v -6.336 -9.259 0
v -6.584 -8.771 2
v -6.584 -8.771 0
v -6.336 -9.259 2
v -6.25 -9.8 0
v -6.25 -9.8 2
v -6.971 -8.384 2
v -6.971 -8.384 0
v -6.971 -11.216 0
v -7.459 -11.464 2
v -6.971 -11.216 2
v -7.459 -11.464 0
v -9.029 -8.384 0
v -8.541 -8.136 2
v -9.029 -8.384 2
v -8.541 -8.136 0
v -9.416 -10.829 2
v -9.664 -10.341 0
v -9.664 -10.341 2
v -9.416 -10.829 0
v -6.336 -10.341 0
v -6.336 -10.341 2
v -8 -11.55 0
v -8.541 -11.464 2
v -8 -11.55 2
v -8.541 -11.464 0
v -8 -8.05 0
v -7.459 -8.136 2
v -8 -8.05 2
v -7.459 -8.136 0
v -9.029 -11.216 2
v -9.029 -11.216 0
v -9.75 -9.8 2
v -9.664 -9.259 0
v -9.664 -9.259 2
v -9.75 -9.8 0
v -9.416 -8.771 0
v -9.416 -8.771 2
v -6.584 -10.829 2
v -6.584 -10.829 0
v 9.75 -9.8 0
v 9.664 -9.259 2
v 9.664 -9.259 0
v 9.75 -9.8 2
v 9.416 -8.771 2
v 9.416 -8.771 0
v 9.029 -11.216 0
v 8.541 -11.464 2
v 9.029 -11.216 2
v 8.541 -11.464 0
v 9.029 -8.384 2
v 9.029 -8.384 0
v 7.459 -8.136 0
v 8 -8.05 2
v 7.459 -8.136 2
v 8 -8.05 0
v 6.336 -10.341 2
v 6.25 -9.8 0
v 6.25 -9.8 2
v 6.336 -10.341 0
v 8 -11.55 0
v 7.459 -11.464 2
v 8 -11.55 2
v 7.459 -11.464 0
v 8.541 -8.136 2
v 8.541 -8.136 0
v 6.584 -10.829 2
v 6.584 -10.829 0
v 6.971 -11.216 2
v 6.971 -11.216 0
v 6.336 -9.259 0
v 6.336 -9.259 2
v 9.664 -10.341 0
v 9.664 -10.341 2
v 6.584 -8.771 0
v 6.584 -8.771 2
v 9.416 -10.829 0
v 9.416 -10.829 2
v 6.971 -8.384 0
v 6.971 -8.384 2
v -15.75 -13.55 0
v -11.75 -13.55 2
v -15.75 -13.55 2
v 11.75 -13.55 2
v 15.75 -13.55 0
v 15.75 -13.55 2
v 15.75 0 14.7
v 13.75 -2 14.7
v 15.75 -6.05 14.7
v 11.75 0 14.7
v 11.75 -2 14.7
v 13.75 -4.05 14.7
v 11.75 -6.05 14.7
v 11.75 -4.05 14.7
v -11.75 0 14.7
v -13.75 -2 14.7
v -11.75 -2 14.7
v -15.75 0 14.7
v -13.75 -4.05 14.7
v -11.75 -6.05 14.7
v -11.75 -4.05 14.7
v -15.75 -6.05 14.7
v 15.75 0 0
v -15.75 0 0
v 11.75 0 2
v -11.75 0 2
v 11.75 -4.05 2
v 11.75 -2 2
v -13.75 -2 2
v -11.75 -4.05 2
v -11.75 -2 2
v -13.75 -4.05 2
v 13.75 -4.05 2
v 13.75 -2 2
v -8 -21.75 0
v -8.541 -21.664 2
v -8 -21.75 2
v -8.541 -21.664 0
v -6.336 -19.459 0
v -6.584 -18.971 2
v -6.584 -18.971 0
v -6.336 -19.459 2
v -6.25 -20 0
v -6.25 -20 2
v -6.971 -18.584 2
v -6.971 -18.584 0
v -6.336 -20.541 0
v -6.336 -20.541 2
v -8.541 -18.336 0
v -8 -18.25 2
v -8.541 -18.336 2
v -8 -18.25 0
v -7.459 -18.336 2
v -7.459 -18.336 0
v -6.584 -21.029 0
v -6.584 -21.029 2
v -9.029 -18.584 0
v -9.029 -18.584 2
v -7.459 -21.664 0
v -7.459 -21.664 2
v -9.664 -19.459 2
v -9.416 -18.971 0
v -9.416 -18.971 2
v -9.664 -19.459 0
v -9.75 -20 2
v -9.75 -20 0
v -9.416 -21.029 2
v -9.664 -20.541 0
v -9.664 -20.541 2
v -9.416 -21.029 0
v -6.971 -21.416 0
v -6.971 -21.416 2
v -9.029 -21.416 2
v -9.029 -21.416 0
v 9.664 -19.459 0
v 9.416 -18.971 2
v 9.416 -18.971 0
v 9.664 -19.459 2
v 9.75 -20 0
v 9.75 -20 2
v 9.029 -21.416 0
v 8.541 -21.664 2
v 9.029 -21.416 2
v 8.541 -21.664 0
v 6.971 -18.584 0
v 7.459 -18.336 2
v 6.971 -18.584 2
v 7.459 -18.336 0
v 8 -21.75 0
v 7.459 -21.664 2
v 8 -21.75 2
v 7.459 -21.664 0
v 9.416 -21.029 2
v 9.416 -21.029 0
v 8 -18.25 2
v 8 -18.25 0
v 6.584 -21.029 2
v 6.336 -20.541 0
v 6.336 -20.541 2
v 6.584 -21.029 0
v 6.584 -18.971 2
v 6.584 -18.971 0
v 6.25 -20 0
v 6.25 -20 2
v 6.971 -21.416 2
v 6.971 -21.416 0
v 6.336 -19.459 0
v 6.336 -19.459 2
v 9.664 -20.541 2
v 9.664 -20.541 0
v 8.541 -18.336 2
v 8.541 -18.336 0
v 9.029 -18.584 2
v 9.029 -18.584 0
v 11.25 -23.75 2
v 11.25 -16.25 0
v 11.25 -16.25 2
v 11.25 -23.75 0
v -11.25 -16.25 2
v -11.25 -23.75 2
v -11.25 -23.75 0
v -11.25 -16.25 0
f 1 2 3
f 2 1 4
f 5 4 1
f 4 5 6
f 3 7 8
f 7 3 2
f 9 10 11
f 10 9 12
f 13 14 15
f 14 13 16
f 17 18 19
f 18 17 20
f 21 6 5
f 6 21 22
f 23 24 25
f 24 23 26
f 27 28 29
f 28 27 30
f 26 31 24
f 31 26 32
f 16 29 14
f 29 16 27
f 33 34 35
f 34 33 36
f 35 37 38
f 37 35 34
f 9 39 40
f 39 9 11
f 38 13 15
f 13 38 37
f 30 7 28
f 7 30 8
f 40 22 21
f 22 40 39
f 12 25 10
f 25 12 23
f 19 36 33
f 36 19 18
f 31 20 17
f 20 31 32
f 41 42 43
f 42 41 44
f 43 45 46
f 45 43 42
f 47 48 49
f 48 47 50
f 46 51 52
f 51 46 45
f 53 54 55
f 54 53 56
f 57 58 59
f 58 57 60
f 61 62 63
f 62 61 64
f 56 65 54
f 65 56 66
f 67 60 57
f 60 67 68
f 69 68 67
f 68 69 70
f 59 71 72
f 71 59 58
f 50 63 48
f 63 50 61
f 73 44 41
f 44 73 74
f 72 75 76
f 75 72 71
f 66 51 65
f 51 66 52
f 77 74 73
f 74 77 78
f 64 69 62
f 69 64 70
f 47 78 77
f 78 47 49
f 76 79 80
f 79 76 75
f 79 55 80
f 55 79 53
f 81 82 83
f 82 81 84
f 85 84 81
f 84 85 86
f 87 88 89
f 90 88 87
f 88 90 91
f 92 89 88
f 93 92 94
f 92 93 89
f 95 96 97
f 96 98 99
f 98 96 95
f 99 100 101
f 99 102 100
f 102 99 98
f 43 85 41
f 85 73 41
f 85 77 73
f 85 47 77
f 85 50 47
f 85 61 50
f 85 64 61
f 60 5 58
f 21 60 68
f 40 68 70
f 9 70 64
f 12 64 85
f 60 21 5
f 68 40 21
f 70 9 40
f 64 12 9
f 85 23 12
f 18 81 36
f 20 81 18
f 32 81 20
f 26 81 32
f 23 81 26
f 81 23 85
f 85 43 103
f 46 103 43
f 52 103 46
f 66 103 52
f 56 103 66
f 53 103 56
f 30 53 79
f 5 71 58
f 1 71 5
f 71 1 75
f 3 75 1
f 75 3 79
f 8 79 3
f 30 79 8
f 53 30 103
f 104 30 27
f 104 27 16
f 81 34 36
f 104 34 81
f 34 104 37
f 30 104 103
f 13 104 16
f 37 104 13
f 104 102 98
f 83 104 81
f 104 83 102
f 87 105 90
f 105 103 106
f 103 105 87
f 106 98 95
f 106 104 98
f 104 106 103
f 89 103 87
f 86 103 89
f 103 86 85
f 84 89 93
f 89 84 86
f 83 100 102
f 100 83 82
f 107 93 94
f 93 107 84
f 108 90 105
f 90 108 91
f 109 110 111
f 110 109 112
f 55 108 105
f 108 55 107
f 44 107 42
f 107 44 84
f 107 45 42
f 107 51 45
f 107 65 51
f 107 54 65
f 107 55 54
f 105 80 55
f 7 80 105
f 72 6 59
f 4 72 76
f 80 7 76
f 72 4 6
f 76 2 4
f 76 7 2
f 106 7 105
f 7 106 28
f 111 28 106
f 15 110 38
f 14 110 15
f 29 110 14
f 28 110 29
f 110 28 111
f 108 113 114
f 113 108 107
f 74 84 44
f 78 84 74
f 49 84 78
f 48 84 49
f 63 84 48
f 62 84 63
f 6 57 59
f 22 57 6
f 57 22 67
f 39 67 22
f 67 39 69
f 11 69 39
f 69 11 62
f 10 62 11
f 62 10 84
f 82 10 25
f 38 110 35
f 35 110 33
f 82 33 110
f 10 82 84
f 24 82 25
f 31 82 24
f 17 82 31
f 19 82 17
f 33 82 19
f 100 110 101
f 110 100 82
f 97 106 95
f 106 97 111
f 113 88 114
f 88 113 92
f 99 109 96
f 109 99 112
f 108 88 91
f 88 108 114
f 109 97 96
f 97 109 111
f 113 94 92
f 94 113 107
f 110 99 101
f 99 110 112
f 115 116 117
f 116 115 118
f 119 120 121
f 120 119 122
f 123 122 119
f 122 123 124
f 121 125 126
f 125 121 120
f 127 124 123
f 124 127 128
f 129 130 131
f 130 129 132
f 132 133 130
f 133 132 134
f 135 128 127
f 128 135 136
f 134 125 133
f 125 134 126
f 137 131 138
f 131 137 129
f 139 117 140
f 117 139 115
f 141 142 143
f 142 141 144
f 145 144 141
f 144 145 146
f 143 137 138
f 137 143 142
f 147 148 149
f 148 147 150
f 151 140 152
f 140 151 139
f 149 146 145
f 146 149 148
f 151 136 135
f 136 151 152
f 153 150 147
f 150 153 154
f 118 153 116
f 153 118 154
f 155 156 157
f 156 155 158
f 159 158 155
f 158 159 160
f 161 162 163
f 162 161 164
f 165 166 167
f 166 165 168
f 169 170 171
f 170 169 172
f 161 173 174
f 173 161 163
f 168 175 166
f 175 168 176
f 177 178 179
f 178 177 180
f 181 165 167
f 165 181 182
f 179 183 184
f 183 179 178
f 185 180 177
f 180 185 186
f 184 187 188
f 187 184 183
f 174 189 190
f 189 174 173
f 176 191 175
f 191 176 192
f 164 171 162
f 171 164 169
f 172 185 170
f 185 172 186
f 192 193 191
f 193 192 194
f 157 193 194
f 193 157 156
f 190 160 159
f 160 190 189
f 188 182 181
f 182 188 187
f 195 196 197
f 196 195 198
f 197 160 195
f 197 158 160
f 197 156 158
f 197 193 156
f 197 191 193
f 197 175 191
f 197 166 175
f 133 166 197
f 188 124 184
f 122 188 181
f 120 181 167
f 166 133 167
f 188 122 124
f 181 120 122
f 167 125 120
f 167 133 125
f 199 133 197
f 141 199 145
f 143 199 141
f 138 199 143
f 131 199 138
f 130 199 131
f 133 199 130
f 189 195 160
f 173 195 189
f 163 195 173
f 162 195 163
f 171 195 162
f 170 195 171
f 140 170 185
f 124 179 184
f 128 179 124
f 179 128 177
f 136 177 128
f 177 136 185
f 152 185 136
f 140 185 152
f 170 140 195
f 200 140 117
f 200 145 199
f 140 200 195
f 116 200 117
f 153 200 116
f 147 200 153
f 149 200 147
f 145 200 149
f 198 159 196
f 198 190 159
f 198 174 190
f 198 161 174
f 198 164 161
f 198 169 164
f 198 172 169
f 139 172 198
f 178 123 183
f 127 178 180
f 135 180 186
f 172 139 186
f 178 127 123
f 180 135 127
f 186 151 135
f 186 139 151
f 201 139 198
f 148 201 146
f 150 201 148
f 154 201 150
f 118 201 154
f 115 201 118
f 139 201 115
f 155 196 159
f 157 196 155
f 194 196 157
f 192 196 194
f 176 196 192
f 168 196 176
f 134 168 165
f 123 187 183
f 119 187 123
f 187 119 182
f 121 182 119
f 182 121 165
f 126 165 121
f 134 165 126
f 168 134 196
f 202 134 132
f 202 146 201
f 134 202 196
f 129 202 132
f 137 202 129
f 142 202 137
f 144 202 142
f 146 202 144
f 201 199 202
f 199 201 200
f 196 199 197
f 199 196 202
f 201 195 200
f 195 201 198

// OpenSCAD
/*
 * Vertical PCB Mounting Bracket
 *
 * by Alex Franke (CodeCreations), Oct 2012
 * http://www.theFrankes.com
 * 
 * Licenced under Creative Commons Attribution - Non-Commercial - Share Alike 3.0 
 * 
 * DESCRIPTION: This little bracket provides an easy way to mount a PCB vertically. It includes
 *   a small wire clamp that can be used to hold PCB wires in place. I use it to hold a small 1"  
 *   by 0.5" PCB that has a bank of header pins for X, Y, Z, and E motors. 
 * 
 * INSTRUCTIONS: Set User-defined values, render, and print. Insert the PCB in the channel and 
 *   route the wires between the mounting holes. Place the wire clamp on top and mount using the 
 *   holes. You may need to tweak the values a bit for a snug fit. 
 * 
 * THING: http://www.thingiverse.com/thing:34308
 * 
 * v1.00, Jun 15, 2012: Initial version. 
 *
 */

/////////////////////////////////////////////////////////////////////////////
// User-defined values... 
/////////////////////////////////////////////////////////////////////////////

// Describe the PCB 
boardWidth       = 27.5;  // Width of the PCB or board to hold
boardThickness   = 2.05;  // Thickness of the PCB or board to hold
clipHeight       = 12.7;  // The height of the PCB or board to hold 

// Describe the bracket 
thickness        = 2;     // The thickness of the material surrounding the board 
baseThickness    = 2;     // The thickness of the base 
supportWidth     = 4;     // The overall width of the support risers
holeDiameter     = 3.5;   // The diameter of the holes 
holePadding      = 2;     // The distance between the edge of the hole other edges or walls

// Describe the wire clamp 
includeWireClamp = true;  // Whether or not to include the wire clamp 
play             = 1;     // The amount of play in the wire clamp

// Other parameters 
$fn              = 20;    // General circle quality. 


/////////////////////////////////////////////////////////////////////////////
// Some calculated values... 
/////////////////////////////////////////////////////////////////////////////

overallSize = [	boardWidth+thickness*2, 
				boardThickness+thickness*2+holeDiameter+holePadding*2, 
				baseThickness+clipHeight];

X=0;
Y=1;
Z=2;

/////////////////////////////////////////////////////////////////////////////
// The code... 
/////////////////////////////////////////////////////////////////////////////

difference() {
	translate([overallSize[X]/2,0,0]) 
		rotate([90,0,-90]) 
			linear_extrude(height=overallSize[X])
				polygon(points=[
					[0,0],
					[0,overallSize[Z]],
					[boardThickness+thickness*2,overallSize[Z]],
					[overallSize[1],baseThickness],
					[overallSize[1],0],
					[0,0]
				]);

	translate([0,-overallSize[Y]/2,overallSize[Z]/2+baseThickness])
		cube([overallSize[X]-supportWidth*2,overallSize[Y]+1,overallSize[Z]], center=true);

	translate([0,-boardThickness/2-thickness,clipHeight/2+baseThickness+0.5]) 
		cube([boardWidth,boardThickness,clipHeight+1], center=true);

	for(i=[-1,1]) 
		translate([	i*(overallSize[X]/2-supportWidth-holePadding-holeDiameter/2),
					-boardThickness-thickness*2-holePadding-holeDiameter/2,
					-0.5]) 
			cylinder(h=boardThickness+1, r=holeDiameter/2);

}

if ( includeWireClamp ) {
	translate([0,-20,thickness/2]) 
	difference() {
		cube([	overallSize[X]-supportWidth*2-play,
				holeDiameter+holePadding*2,
				thickness], center=true);
	
		for(i=[-1,1]) 
			translate([	i*(overallSize[X]/2-supportWidth-holePadding-holeDiameter/2),0,0]) 
				cylinder(h=boardThickness+1, r=holeDiameter/2, center=true);
	
	
	}
}
